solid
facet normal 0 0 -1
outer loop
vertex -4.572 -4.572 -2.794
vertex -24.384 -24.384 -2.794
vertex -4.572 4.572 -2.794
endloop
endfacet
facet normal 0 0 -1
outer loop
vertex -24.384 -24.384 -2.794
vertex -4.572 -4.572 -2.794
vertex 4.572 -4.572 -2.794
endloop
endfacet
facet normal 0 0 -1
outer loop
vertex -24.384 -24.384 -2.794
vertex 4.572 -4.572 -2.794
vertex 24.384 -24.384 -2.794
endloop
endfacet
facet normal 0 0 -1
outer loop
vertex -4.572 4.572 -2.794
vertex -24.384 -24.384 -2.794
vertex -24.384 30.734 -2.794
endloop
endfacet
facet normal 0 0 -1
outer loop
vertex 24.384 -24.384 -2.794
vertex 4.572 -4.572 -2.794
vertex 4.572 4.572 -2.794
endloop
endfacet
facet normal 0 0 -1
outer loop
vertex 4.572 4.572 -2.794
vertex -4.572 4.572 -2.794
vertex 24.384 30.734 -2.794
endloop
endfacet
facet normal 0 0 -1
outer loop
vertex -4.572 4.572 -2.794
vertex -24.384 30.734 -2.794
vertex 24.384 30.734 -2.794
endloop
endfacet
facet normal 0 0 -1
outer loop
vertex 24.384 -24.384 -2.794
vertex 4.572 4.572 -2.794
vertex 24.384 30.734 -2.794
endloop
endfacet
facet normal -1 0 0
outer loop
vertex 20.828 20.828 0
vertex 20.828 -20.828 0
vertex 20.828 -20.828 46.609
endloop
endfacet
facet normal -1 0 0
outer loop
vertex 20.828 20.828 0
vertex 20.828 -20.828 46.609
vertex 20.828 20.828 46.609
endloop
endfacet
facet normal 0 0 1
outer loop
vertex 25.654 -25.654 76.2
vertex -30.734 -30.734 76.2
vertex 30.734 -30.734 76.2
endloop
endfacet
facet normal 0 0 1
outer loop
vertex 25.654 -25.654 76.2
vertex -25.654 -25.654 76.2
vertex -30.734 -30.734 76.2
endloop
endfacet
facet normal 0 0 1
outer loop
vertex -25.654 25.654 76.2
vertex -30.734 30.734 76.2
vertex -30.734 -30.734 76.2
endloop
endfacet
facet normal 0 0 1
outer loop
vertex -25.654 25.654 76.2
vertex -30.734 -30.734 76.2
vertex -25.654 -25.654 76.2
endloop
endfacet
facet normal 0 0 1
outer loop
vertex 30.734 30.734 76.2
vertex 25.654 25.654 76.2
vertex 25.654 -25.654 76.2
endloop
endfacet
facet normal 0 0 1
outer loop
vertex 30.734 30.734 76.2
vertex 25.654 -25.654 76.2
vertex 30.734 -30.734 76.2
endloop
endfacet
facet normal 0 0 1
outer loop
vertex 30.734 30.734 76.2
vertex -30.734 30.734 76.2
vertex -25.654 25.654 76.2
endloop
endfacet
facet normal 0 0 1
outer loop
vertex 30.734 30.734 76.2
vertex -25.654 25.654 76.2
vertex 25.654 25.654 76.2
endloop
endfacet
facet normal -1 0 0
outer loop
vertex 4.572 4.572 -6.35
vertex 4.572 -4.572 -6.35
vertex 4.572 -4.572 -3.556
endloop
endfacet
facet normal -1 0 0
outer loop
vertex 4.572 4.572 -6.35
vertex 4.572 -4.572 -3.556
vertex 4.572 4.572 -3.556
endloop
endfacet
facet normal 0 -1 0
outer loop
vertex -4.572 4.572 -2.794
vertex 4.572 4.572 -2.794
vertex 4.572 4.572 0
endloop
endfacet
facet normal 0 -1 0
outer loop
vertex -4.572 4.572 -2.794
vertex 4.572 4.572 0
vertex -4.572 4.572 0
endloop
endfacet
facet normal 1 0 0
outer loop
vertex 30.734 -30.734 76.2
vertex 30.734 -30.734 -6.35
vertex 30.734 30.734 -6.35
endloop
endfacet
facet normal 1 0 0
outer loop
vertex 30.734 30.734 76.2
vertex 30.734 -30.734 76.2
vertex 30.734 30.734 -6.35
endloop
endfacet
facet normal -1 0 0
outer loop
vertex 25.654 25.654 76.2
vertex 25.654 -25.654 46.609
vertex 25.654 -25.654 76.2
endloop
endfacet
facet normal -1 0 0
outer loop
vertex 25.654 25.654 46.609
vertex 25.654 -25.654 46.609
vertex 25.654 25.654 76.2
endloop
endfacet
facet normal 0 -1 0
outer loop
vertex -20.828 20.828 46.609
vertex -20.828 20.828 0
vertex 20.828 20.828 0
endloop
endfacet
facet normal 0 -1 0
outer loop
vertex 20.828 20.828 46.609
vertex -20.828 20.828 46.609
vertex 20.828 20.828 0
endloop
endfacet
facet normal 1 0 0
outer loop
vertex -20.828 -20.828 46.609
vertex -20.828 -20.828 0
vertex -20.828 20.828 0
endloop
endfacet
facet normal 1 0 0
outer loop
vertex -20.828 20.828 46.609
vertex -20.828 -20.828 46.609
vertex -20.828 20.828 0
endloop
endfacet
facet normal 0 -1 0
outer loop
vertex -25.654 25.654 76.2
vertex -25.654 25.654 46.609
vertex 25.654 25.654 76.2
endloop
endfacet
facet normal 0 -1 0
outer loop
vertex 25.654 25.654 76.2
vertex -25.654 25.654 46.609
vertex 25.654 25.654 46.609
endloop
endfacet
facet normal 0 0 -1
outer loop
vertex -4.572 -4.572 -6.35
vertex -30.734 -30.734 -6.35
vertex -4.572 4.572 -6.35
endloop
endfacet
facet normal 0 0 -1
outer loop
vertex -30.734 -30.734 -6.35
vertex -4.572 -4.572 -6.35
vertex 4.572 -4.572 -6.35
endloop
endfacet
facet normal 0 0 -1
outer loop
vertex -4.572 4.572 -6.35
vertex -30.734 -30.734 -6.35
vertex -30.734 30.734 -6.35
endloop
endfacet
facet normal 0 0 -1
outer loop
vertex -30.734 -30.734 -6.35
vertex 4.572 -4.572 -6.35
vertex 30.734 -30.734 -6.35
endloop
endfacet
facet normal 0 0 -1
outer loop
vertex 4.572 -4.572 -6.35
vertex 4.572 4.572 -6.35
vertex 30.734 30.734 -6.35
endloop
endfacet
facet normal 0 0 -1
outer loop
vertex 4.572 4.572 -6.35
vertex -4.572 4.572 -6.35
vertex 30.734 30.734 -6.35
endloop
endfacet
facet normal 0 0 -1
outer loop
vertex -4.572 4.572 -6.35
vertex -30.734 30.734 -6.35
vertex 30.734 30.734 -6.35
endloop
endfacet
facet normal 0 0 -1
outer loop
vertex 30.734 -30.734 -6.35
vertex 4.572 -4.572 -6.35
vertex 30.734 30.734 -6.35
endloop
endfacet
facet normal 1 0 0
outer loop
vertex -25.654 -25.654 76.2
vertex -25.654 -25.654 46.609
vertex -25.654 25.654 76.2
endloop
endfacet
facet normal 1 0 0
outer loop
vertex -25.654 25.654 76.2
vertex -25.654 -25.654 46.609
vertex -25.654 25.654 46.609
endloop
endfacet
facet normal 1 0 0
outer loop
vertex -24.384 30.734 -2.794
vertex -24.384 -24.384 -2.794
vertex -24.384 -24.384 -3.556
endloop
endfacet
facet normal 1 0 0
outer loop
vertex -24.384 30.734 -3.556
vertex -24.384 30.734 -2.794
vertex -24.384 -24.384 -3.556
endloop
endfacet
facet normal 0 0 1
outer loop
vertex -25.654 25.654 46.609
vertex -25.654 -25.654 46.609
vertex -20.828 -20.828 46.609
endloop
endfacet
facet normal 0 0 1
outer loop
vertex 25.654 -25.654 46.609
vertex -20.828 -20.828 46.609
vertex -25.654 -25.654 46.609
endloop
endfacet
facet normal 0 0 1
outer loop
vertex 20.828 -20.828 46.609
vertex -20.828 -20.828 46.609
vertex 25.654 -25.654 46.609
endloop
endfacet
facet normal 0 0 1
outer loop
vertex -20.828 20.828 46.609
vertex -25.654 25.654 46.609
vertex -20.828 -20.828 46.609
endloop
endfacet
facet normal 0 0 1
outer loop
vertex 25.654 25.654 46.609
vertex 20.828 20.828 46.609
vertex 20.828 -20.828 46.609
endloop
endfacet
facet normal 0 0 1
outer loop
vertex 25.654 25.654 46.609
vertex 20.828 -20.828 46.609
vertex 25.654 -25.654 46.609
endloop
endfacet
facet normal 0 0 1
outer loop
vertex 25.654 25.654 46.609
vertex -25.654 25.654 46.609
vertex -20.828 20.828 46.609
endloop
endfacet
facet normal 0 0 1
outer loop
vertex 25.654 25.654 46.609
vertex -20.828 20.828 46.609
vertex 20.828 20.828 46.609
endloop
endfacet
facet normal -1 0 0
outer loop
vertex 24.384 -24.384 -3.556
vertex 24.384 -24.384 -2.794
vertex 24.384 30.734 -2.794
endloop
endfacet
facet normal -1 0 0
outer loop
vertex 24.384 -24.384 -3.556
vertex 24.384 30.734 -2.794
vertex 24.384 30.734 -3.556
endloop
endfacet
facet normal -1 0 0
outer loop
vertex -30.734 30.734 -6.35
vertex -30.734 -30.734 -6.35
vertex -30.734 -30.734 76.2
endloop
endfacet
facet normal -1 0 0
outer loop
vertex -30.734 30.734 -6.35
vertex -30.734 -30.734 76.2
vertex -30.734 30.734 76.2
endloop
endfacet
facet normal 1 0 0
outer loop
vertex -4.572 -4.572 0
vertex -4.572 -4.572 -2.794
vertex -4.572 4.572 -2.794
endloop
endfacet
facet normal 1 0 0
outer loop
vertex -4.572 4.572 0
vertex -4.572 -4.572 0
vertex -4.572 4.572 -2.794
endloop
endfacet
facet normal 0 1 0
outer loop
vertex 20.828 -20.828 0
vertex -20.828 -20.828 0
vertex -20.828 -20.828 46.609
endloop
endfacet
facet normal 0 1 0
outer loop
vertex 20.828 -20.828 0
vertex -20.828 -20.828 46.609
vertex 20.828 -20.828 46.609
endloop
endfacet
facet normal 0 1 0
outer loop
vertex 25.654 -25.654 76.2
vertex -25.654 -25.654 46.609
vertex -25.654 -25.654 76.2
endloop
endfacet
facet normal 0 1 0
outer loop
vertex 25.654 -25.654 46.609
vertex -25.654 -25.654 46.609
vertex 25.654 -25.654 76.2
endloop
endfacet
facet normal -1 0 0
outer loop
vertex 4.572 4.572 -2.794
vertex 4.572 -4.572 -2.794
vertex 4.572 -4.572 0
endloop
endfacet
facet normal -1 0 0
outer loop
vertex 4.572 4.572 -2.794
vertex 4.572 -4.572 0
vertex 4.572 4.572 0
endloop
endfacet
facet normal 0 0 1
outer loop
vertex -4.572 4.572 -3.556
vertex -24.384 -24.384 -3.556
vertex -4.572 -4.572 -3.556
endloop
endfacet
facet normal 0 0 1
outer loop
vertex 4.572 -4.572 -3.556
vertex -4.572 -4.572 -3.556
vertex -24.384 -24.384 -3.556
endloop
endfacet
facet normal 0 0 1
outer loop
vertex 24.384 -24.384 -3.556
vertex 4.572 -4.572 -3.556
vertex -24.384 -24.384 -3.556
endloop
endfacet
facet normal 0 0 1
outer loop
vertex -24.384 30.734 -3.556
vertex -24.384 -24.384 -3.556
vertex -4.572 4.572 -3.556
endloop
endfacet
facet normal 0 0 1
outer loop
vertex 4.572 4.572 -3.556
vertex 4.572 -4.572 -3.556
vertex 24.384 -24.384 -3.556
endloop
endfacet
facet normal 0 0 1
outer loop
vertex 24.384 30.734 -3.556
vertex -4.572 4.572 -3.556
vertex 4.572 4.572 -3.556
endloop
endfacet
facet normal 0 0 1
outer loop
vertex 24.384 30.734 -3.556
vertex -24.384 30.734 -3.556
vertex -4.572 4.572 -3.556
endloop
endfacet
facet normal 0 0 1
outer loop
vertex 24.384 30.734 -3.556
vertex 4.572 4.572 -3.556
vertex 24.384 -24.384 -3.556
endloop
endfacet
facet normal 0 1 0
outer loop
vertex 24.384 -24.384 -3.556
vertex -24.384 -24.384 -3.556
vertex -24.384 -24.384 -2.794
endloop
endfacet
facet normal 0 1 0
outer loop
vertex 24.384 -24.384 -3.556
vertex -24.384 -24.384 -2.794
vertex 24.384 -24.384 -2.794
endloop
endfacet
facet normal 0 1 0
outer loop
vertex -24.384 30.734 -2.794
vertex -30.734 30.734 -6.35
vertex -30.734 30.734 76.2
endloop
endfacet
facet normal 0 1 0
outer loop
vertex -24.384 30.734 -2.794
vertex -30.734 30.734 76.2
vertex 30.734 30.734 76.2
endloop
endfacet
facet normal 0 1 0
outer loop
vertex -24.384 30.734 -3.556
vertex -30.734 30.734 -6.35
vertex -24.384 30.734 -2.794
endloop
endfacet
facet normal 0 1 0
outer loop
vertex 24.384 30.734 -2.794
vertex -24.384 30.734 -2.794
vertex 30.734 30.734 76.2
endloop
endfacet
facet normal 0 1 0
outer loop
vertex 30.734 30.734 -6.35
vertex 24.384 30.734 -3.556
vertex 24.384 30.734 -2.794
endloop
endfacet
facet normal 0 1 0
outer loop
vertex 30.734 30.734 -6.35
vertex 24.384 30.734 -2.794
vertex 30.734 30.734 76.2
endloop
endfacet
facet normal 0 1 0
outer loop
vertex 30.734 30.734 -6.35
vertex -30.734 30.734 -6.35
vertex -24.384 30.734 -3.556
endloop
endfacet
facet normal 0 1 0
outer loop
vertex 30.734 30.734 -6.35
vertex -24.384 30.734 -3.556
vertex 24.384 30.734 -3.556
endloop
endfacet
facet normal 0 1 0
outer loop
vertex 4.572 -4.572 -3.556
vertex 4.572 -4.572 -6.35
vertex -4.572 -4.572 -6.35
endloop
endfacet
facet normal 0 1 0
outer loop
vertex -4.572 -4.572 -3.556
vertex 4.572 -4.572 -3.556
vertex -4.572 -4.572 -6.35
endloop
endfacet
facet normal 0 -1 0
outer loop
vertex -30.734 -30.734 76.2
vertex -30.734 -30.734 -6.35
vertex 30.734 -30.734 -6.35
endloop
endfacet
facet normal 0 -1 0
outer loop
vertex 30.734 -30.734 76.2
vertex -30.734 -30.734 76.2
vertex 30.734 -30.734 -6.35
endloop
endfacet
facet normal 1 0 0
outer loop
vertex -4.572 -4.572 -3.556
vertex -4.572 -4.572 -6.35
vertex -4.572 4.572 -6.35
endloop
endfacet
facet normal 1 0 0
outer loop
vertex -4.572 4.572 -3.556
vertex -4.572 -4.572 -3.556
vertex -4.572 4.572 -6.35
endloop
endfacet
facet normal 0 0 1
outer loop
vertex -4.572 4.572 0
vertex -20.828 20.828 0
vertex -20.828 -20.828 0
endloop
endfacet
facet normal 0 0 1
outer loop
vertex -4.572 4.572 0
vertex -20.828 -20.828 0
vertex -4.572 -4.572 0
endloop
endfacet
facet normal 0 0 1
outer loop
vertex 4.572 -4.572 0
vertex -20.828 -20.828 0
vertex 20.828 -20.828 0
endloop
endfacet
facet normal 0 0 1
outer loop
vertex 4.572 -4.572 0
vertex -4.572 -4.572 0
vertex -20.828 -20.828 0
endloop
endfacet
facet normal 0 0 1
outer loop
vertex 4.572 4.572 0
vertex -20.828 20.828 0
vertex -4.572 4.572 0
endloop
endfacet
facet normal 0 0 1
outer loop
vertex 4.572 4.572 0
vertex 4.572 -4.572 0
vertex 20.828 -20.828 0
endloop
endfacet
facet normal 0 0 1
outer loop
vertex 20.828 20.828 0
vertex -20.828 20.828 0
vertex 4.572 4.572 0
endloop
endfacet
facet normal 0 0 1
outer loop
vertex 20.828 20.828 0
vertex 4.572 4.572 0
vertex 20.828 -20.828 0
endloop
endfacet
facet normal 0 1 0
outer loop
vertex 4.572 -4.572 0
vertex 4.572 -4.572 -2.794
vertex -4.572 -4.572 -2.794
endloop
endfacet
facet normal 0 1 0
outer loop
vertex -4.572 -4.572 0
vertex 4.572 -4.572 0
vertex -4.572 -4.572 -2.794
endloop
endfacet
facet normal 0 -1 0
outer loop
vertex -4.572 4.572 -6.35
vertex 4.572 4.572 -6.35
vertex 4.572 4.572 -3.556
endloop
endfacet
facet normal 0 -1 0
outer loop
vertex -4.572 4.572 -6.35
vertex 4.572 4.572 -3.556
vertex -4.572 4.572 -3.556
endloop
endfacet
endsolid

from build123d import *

# Parameters (mm, degrees)
BOSS_EXTRUDE1_DEPTH      = 76.2
BOSS_EXTRUDE1_DEPTH_BACK = 6.35
SKETCH1_W                = 61.468
SKETCH1_H                = 61.468
SKETCH1_3_W              = 41.656
SKETCH1_3_H              = 41.656
CUT_EXTRUDE1_DEPTH       = 88.724554784
SKETCH2_W                = 51.308
SKETCH2_H                = 51.308
CUT_EXTRUDE2_DEPTH       = 69.511409218
SKETCH5_W                = 9.144
SKETCH5_H                = 9.144
CUT_EXTRUDE3_DEPTH       = 94.293408192
SKETCH6_W                = 48.768
SKETCH6_H                = 0.762
CUT_EXTRUDE4_DEPTH       = 55.118


with BuildPart() as part:
    # Sketch1 → Boss-Extrude1 (new, two sides: drawn at the far end of the back side and taken through both)
    with BuildSketch(Plane.XY.offset(-BOSS_EXTRUDE1_DEPTH_BACK)):
        Rectangle(SKETCH1_W, SKETCH1_H)
    extrude(amount=BOSS_EXTRUDE1_DEPTH + BOSS_EXTRUDE1_DEPTH_BACK)

    # Sketch1<3> → Cut-Extrude1 (cut, through all)
    with BuildSketch(Plane.XY):
        Rectangle(SKETCH1_3_W, SKETCH1_3_H)
    extrude(amount=CUT_EXTRUDE1_DEPTH, mode=Mode.SUBTRACT)

    # Sketch2 → Cut-Extrude2 (cut, through all)
    with BuildSketch(Plane.XY.offset(46.609)):
        Rectangle(SKETCH2_W, SKETCH2_H)
    extrude(amount=CUT_EXTRUDE2_DEPTH, mode=Mode.SUBTRACT)

    # Sketch5 → Cut-Extrude3 (cut, through all)
    with BuildSketch(Plane(origin=(0, 0, -6.35), x_dir=(-1, 0, 0), z_dir=(0, 0, -1))):
        Rectangle(SKETCH5_W, SKETCH5_H)
    extrude(amount=-CUT_EXTRUDE3_DEPTH, mode=Mode.SUBTRACT)

    # Sketch6 → Cut-Extrude4 (cut)
    with BuildSketch(Plane(origin=(0, 30.734, 0), x_dir=(1, 0, 0), z_dir=(0, 1, 0))):
        with Locations((0, 3.175)):
            Rectangle(SKETCH6_W, SKETCH6_H)
    extrude(amount=-CUT_EXTRUDE4_DEPTH, mode=Mode.SUBTRACT)


solid = part.part
